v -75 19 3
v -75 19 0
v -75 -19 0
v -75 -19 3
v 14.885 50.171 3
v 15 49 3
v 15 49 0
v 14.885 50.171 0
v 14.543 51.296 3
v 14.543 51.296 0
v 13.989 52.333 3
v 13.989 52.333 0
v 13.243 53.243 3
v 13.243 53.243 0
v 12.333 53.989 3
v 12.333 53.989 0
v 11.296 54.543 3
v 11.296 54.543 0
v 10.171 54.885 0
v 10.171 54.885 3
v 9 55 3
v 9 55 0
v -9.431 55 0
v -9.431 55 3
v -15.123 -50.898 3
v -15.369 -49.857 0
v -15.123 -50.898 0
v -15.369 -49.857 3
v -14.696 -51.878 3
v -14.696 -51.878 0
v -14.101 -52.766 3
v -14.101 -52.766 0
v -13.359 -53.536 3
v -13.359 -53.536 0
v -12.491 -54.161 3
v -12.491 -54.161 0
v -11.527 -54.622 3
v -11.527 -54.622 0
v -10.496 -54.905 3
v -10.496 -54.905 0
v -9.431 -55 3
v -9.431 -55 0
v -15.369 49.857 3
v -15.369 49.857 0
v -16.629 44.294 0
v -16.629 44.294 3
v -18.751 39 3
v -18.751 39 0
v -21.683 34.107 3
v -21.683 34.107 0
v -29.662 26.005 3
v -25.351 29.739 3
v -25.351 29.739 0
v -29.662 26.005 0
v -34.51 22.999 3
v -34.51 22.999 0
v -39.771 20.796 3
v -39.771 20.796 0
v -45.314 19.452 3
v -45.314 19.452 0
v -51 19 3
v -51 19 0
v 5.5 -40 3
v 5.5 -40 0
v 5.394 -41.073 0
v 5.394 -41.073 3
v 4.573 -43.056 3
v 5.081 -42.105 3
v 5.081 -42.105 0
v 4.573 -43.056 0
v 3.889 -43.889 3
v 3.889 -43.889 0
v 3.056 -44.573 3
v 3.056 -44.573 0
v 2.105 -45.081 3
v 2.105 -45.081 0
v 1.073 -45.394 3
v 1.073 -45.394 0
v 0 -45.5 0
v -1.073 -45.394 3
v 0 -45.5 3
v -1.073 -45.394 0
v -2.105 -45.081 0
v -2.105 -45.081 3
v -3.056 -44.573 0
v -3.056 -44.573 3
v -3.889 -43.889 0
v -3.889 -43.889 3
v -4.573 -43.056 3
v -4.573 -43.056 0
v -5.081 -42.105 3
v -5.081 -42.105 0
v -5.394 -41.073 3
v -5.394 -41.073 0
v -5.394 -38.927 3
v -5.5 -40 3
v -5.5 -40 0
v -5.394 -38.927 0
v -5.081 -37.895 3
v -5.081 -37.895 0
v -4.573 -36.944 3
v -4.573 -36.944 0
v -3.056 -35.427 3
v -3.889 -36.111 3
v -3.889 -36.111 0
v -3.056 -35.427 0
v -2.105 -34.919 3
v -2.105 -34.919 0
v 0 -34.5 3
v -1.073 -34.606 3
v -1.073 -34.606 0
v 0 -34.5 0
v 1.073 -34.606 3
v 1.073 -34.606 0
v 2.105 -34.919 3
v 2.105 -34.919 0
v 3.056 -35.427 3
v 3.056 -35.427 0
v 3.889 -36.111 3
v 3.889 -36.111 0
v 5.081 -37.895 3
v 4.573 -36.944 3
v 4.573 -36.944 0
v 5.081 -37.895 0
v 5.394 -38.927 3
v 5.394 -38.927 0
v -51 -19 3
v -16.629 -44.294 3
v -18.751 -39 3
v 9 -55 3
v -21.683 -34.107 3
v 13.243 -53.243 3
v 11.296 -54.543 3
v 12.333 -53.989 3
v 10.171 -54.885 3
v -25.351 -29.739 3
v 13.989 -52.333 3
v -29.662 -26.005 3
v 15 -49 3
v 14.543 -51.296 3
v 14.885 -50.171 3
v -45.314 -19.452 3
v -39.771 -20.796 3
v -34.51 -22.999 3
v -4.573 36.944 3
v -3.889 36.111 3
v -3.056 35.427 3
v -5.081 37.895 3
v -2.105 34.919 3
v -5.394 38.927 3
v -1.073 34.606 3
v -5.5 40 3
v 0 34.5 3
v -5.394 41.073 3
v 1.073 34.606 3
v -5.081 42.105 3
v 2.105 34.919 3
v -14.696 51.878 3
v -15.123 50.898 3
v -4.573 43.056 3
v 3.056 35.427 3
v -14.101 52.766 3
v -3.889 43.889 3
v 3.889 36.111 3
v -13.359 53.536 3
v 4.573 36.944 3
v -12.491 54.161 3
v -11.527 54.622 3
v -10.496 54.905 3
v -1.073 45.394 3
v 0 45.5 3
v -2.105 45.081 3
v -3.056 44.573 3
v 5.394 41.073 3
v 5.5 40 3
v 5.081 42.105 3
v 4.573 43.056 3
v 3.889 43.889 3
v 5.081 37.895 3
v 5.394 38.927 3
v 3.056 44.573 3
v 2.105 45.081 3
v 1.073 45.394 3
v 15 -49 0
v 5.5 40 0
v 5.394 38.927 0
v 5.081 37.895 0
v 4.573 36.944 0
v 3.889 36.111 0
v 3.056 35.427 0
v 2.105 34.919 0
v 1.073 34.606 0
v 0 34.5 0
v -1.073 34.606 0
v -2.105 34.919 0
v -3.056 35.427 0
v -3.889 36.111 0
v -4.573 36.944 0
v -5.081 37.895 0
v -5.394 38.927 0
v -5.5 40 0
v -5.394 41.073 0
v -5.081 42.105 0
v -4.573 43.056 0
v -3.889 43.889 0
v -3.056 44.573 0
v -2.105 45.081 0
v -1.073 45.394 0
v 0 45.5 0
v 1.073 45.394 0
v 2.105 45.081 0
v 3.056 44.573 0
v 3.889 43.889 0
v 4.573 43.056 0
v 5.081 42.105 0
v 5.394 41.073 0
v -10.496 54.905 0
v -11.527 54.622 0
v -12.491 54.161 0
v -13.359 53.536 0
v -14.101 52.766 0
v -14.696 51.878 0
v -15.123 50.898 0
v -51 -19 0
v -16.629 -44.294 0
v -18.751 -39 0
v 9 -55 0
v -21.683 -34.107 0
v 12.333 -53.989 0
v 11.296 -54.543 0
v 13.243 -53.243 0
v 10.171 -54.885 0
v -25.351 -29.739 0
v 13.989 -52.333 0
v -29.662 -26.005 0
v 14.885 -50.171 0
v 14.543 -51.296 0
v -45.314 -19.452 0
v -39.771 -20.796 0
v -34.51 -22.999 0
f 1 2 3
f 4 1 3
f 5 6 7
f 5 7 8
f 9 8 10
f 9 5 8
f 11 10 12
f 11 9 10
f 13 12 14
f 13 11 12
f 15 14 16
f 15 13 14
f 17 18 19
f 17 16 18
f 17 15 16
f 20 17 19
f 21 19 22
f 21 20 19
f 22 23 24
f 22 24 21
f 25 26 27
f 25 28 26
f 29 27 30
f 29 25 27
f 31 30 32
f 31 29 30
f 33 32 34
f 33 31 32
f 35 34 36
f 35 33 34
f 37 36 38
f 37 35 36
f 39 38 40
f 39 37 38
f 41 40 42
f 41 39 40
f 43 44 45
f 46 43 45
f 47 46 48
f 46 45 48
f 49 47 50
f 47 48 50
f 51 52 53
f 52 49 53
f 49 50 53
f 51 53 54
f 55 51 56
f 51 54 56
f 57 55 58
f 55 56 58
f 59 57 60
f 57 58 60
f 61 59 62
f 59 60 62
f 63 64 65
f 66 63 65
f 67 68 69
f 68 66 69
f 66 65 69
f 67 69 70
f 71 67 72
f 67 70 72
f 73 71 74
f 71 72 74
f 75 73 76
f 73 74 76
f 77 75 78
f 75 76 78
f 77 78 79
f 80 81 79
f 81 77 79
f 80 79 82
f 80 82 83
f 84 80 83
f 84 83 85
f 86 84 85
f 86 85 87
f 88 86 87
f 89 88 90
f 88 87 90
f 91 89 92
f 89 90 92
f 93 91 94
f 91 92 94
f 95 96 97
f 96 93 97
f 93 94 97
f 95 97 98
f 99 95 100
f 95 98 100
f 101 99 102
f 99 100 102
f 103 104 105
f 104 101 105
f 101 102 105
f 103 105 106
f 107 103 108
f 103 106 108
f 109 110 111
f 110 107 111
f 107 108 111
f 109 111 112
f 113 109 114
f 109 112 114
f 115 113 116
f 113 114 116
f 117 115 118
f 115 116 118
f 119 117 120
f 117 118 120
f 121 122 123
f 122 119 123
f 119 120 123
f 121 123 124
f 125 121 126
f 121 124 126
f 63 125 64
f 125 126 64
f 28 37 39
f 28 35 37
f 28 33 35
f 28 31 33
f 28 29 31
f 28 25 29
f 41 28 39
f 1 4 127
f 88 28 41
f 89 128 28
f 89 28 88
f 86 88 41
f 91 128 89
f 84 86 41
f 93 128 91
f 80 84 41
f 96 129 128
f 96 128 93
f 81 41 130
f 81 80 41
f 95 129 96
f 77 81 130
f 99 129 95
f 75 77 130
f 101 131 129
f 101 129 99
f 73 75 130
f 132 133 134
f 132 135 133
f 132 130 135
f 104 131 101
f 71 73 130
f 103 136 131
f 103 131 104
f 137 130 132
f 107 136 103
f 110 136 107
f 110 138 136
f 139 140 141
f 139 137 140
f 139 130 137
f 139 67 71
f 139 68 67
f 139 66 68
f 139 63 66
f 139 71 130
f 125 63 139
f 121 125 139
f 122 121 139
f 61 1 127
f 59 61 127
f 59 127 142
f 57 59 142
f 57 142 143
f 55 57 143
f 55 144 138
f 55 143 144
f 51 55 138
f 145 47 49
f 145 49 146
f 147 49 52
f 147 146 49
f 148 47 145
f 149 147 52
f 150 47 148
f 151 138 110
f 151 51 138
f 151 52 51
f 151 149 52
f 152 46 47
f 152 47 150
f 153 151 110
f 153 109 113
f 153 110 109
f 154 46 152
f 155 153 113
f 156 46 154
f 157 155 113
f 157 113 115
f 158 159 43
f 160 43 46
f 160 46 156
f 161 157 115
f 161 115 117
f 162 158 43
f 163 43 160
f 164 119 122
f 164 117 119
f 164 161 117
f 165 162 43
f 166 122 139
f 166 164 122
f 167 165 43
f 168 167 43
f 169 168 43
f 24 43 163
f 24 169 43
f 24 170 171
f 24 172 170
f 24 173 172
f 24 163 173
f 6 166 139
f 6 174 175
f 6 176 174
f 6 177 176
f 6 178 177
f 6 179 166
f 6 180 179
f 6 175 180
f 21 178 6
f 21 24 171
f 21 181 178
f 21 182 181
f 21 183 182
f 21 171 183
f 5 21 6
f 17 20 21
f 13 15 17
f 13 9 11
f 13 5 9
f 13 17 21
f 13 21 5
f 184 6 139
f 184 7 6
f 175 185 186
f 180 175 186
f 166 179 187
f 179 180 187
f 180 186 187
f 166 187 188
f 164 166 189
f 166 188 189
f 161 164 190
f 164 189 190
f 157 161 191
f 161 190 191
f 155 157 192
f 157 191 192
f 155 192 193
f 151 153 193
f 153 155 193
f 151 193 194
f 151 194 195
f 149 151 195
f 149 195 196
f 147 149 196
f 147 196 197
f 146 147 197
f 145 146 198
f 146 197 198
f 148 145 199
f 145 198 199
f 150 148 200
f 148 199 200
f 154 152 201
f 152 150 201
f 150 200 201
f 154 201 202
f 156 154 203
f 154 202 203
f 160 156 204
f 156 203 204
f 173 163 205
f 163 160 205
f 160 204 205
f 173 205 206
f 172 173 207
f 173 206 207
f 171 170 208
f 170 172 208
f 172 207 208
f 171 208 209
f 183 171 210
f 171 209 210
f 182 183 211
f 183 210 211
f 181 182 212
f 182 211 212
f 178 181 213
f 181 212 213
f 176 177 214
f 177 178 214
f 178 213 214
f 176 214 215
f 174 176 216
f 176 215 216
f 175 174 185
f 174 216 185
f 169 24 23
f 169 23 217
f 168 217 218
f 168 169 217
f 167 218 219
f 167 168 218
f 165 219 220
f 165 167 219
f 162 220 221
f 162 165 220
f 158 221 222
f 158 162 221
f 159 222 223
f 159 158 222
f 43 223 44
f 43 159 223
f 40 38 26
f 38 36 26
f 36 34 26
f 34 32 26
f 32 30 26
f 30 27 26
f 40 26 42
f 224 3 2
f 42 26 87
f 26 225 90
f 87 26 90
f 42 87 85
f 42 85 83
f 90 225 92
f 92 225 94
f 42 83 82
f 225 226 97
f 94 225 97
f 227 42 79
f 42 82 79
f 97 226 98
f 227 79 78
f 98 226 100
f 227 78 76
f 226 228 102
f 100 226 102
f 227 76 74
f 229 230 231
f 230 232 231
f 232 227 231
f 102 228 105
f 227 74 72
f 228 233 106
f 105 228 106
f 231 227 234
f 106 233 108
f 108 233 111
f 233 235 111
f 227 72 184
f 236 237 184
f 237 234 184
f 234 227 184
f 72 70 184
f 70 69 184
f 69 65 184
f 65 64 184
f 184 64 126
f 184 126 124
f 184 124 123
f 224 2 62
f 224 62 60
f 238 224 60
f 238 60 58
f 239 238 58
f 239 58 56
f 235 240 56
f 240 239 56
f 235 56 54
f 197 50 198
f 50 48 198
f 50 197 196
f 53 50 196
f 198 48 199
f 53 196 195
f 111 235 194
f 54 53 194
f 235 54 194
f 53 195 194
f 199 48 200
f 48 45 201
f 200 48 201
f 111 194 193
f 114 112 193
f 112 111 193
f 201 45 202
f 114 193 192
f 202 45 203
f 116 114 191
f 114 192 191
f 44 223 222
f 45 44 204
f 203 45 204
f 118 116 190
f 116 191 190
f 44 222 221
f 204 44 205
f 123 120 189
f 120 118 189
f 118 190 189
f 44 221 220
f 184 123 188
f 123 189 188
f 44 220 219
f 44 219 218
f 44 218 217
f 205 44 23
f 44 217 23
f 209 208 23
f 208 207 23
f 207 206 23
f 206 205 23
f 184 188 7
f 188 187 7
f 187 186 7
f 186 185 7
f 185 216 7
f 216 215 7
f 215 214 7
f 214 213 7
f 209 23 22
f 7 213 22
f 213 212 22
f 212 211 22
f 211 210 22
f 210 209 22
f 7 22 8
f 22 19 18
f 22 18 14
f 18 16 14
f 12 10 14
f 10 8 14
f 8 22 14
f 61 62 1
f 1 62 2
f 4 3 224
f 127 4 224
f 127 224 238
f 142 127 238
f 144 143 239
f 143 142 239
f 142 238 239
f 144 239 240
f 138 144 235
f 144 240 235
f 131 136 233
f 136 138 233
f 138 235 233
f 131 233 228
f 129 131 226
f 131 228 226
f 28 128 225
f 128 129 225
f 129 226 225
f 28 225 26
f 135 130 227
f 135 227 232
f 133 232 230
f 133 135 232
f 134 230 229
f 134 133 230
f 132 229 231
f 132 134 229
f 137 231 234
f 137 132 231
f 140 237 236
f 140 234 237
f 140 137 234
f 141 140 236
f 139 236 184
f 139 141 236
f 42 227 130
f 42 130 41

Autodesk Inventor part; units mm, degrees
ref_plane "YZ Plane" through (0, 0, 0) normal (1, 0, 0) x (0, 1, 0)
ref_plane "XZ Plane" through (0, 0, 0) normal (0, 1, 0) x (-1, 0, 0)
ref_plane "XY Plane" through (0, 0, 0) normal (0, 0, 1) x (1, 0, 0)
sketch "Sketch1" plane through (0, 0, 0) normal (0, 0, 1) x (1, 0, 0)
  line L0 (-15, 55) -> (15, 55)
  line L1 (15, 55) -> (15, -55)
  line L2 (15, -55) -> (-15, -55)
  line L3 (-15, -55) -> (-15, 55)
  line L4 (-15, 55) -> (15, -55) construction
  line L5 (15, 55) -> (-15, -55) construction
  line L6 (-15, 19) -> (-75, 19)
  line L7 (-75, 19) -> (-75, -19)
  line L8 (-75, -19) -> (-15, -19)
  line L9 (-15, -19) -> (-15, 19)
  arc A0 (-51, 19) -> (-15, 55) centre (-51, 55) ccw
  arc A1 (-15, -55) -> (-51, -19) centre (-51, -55) ccw
  circle A2 centre (0, 40) radius 5.5
  circle A3 centre (0, -40) radius 5.5
  line L10 (0, 0) -> (15, 0) construction
  point P0 (-75, 0)
  dimension "d157" = 30
  dimension "d158" = 110
  dimension "d159" = 38
  dimension "d160" = 80
  dimension "d161" = 11
  dimension "d162" = 60
extrude "Plate3" add sketch "Sketch1" along normal blind 3
fillet "Corner Round2" radius 6 4 edges at (-15, 55, 1.5) (15, 55, 1.5) (-15, -55, 1.5) (15, -55, 1.5)
equation "\"BendReliefWidth\" = Thickness"
equation "\"BendReliefDepth\" = 0.5 * Thickness"
equation "\"CornerReliefSize\" = 4 * Thickness"
equation "\"MinimumRemnant\" = 2 * Thickness"
equation "\"GapSize\" = Thickness"
equation "\"Thickness\" = 3"
properties part number "MSC 815 wall inner" material "AISI304"
